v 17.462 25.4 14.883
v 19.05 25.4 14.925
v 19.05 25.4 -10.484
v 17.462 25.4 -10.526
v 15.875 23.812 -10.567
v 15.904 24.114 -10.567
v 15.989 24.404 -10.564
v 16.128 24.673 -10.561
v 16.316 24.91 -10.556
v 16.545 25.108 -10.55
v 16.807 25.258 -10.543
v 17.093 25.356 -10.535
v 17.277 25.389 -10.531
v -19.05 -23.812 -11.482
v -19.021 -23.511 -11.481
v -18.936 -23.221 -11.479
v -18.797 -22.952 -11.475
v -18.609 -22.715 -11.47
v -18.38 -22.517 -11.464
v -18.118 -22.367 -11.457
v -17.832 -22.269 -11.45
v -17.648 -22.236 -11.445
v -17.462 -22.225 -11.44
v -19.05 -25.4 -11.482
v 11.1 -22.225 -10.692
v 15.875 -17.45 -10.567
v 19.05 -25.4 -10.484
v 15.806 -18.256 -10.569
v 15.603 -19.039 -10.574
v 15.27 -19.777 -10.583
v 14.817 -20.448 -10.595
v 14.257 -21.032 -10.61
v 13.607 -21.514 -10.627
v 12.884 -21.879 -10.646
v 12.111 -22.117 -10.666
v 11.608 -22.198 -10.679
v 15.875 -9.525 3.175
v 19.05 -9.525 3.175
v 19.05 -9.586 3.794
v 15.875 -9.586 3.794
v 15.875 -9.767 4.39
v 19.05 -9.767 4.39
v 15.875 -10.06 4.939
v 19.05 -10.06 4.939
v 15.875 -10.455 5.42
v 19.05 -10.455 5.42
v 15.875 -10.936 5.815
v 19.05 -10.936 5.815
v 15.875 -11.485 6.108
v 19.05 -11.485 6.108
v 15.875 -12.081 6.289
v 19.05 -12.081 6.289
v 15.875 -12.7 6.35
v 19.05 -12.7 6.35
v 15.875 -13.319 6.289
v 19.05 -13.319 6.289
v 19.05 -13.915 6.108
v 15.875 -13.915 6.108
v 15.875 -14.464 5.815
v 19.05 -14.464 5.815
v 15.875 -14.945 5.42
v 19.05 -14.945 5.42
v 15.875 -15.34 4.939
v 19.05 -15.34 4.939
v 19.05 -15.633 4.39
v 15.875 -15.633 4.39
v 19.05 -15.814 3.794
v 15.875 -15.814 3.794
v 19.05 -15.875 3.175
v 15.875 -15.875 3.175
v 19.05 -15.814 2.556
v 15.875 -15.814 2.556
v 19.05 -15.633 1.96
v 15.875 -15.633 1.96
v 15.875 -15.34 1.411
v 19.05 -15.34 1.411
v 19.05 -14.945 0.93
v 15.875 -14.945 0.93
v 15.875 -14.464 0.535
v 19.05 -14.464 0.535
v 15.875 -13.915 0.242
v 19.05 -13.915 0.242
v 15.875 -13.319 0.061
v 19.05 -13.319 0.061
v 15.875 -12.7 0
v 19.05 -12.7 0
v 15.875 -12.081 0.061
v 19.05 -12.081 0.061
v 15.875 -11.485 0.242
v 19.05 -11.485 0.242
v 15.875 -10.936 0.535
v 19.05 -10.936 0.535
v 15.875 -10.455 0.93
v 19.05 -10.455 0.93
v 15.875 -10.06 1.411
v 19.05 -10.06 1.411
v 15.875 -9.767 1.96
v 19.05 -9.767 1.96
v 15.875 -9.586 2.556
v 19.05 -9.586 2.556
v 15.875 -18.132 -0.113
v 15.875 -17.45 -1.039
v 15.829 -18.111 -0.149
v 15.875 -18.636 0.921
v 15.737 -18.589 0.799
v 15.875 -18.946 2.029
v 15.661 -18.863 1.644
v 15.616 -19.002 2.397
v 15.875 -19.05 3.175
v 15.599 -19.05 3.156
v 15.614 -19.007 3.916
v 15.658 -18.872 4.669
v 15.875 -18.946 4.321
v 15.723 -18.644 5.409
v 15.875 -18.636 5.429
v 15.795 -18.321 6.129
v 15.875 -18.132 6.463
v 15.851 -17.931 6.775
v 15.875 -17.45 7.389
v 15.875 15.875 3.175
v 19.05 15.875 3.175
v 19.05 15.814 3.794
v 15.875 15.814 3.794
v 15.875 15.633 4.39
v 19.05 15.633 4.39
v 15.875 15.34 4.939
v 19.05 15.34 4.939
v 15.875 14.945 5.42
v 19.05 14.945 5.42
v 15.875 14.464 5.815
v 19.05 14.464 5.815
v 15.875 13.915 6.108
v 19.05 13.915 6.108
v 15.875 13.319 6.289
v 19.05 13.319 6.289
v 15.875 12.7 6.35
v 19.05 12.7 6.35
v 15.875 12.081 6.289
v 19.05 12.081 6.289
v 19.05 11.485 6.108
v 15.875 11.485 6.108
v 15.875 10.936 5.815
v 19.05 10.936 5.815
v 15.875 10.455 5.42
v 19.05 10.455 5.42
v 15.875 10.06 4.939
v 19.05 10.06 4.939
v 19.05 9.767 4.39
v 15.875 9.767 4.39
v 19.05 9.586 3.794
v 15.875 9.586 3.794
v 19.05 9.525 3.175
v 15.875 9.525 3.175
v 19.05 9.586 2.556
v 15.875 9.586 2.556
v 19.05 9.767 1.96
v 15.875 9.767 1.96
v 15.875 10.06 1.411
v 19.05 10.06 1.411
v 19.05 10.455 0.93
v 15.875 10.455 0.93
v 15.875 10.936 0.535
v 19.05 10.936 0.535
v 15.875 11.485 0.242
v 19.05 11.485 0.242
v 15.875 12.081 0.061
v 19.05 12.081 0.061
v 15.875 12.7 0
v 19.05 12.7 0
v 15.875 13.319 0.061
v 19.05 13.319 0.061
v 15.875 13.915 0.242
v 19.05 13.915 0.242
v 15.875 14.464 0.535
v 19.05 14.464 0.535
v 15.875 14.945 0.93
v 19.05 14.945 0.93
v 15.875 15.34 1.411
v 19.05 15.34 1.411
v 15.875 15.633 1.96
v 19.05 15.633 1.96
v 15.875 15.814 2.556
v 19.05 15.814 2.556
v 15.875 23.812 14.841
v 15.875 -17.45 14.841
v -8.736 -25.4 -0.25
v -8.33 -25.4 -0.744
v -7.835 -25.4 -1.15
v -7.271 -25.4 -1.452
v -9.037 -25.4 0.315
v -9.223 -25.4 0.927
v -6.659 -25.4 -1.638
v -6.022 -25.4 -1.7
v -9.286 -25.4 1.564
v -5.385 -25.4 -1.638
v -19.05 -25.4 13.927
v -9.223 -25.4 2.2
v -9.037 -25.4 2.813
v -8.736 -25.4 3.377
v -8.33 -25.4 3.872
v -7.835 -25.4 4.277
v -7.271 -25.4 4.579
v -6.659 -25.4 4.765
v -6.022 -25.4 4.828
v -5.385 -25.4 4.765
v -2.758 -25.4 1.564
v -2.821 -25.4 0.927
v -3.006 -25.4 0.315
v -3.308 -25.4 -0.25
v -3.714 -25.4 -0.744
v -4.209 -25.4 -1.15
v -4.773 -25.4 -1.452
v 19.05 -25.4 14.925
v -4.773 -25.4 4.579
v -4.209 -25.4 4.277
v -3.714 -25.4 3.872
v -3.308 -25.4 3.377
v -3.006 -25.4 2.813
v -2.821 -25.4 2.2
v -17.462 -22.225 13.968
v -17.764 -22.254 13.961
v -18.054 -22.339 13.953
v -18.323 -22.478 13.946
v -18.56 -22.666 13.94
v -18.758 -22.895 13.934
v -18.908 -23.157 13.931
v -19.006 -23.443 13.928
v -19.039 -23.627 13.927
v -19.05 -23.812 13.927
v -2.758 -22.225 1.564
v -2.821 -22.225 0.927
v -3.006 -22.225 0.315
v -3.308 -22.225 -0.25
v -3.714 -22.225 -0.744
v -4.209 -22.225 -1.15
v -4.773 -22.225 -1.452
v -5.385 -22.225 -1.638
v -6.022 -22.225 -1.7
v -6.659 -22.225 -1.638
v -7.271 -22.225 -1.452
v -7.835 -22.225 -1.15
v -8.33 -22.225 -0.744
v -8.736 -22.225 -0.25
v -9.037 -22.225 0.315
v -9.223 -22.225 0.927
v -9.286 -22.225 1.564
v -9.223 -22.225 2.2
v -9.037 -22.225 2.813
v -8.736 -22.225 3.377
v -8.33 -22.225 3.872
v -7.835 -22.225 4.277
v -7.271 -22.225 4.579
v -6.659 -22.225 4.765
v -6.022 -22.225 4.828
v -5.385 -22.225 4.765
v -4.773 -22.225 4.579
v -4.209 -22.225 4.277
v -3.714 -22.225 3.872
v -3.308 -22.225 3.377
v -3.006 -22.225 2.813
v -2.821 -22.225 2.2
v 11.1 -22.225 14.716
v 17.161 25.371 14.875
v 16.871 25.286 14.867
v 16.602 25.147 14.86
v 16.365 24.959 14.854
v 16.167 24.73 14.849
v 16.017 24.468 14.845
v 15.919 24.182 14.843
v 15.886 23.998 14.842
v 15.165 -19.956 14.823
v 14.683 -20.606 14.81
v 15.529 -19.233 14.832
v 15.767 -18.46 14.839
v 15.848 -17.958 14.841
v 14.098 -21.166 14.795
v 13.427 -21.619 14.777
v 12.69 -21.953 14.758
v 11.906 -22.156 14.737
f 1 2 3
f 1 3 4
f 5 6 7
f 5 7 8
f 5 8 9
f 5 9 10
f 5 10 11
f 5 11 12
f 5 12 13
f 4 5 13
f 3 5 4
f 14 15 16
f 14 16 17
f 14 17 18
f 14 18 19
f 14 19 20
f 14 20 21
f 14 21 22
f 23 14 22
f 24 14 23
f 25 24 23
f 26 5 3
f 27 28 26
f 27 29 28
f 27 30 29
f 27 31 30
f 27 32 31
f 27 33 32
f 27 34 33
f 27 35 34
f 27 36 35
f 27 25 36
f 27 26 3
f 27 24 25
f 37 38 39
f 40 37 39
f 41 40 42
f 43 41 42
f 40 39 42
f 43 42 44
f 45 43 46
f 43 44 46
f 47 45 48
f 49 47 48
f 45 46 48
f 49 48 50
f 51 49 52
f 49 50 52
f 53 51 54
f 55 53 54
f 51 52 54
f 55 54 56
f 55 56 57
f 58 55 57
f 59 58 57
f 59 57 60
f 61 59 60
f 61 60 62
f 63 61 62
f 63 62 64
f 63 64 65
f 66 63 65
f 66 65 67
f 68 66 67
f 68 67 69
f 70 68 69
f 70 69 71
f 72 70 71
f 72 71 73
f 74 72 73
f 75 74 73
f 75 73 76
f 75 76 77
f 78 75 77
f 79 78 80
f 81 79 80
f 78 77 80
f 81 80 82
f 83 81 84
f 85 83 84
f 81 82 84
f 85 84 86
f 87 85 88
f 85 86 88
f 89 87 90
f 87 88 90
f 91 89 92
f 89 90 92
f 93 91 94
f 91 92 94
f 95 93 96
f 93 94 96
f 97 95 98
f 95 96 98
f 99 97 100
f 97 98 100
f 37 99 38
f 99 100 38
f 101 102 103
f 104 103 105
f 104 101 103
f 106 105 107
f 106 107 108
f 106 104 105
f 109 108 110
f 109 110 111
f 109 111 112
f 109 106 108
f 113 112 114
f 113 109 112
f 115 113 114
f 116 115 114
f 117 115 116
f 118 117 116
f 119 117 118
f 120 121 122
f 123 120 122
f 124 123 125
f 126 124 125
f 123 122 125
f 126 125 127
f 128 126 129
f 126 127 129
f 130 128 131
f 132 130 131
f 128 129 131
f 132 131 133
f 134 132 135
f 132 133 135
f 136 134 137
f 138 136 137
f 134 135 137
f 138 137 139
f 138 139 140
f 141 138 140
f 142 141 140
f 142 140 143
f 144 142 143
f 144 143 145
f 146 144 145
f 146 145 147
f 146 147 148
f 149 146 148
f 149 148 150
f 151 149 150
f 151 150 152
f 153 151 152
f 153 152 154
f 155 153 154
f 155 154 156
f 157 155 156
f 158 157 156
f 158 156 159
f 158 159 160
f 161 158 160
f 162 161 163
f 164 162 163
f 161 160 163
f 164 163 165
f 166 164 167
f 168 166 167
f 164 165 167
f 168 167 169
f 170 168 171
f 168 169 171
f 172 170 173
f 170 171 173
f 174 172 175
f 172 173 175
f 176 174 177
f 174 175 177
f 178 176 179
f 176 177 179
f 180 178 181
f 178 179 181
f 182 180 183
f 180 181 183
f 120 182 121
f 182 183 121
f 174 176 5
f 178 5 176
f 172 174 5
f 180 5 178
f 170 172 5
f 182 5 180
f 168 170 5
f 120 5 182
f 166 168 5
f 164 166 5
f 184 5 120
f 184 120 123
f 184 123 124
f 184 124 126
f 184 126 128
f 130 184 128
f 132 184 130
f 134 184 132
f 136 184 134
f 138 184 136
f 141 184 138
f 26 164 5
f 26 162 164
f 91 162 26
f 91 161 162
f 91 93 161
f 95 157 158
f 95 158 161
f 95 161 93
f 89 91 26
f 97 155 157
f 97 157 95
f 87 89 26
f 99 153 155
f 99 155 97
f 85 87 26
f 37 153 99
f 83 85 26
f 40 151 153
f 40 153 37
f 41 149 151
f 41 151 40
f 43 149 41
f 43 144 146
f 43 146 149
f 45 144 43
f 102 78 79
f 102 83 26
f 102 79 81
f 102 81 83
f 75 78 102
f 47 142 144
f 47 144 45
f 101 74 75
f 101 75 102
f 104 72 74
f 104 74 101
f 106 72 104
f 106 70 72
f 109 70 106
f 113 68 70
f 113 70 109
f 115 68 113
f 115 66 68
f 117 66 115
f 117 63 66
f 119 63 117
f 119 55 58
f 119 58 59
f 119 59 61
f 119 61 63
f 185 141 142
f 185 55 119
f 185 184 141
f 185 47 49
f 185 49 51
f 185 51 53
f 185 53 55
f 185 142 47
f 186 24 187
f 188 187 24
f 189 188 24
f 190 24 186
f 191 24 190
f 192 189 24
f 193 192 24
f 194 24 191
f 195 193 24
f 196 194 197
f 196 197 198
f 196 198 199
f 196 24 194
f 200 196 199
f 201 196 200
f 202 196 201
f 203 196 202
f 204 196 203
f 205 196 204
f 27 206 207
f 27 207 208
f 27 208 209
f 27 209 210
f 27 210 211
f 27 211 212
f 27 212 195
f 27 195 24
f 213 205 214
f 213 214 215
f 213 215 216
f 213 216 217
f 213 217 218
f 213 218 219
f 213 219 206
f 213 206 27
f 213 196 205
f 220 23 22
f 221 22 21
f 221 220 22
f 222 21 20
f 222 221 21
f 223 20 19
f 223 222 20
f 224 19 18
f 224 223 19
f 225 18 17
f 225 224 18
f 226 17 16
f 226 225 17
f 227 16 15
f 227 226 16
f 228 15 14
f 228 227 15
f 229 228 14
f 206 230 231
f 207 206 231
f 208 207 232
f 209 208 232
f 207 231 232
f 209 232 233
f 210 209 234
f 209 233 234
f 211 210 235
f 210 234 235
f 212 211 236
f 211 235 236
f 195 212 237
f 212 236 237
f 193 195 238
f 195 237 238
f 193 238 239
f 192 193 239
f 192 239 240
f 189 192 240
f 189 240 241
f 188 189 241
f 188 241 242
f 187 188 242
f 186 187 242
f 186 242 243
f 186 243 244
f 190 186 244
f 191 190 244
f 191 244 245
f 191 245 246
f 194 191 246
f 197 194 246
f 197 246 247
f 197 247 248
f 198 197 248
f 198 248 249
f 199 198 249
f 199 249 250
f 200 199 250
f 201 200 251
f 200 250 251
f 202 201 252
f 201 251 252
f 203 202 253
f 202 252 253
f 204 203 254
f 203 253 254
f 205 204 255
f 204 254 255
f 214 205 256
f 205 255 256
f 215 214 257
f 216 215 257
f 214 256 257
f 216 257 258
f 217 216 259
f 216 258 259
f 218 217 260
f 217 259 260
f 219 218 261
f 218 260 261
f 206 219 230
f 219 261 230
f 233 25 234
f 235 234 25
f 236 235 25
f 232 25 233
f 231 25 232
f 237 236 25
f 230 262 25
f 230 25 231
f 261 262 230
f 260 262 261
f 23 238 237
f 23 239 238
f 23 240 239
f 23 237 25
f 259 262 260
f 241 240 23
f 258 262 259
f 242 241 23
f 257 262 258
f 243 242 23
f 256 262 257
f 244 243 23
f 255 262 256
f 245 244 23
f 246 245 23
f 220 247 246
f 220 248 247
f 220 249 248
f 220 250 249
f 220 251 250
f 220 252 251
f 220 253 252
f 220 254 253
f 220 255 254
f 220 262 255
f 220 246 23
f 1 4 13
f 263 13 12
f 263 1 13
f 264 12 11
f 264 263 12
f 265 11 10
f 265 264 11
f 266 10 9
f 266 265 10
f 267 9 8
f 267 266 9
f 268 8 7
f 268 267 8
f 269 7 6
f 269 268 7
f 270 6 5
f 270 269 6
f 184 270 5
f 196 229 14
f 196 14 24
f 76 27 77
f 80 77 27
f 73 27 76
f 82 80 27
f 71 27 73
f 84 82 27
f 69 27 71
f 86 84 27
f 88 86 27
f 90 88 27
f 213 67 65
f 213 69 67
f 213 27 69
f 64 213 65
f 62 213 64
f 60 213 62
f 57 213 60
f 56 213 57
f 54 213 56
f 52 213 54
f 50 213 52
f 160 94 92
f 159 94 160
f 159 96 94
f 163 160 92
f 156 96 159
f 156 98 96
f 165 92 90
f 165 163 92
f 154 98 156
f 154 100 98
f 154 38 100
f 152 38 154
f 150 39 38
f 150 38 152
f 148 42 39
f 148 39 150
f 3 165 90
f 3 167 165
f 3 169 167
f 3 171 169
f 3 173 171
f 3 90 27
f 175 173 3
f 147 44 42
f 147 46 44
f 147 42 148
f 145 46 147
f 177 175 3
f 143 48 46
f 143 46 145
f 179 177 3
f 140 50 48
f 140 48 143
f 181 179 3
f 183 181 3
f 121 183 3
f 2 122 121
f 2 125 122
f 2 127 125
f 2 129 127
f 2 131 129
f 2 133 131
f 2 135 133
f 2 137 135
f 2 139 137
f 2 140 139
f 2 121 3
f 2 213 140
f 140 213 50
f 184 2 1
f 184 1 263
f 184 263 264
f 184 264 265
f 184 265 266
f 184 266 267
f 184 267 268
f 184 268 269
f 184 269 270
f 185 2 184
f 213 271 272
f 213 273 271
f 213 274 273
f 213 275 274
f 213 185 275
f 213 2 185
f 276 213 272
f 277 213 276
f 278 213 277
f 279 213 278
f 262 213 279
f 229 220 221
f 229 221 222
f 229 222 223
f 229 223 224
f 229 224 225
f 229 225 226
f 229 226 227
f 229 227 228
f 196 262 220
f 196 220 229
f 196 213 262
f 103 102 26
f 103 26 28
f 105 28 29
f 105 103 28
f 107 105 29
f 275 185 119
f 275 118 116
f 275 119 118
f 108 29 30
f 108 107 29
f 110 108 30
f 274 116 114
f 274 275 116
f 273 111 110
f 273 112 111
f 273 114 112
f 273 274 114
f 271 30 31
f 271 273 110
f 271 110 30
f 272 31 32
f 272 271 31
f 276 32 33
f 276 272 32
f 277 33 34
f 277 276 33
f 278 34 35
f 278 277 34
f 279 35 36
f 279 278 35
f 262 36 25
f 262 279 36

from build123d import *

# Parameters (mm, degrees)
BOSS_EXTRUDE1_DEPTH     = 15.875
SKETCH4_R               = 3.175
CUT_EXTRUDE1_DEPTH      = 49.464271634
SKETCH3_OUTSIDE_W       = 54.3
SKETCH3_OUTSIDE_H       = 47.95
CUT_EXTRUDE2_DEPTH      = 57.529267862
F_1_4_CLEARANCE_HOLE1_D = 6.5278
SKETCH9_R               = 6.35
CUT_EXTRUDE3_DEPTH      = 2.54


with BuildPart() as part:
    # Sketch2 → Boss-Extrude1 (new, symmetric)
    with BuildSketch(Plane.XY):
        with BuildLine():
            Line((-19.05, -25.4), (19.05, -25.4))
            Line((19.05, -25.4), (19.05, 25.4))
            Line((19.05, 25.4), (17.4625, 25.4))
            ThreePointArc((17.4625, 25.4), (16.339967985, 24.935032015), (15.875, 23.8125))
            Line((15.875, 23.8125), (15.875, -17.4498))
            ThreePointArc((15.875, -17.4498), (14.476376302, -20.826376302), (11.0998, -22.225))
            Line((11.0998, -22.225), (-17.4625, -22.225))
            ThreePointArc((-17.4625, -22.225), (-18.585032015, -22.689967985), (-19.05, -23.8125))
            Line((-19.05, -23.8125), (-19.05, -25.4))
        make_face()
    extrude(amount=BOSS_EXTRUDE1_DEPTH, both=True)

    # Sketch4 → Cut-Extrude1 (cut, through all)
    with BuildSketch(Plane(origin=(19.05, 0, 0), x_dir=(0, 0, -1), z_dir=(1, 0, 0))):
        with Locations(Location((-3.175, 12.7, 0), (0, 0, 90))):
            Circle(SKETCH4_R)
        with Locations(Location((-3.175, -12.7, 0), (0, 0, 90))):
            Circle(SKETCH4_R)
    extrude(amount=-CUT_EXTRUDE1_DEPTH, mode=Mode.SUBTRACT)

    # Sketch3 outside → Cut-Extrude2 (cut, through all)
    with BuildSketch(Plane.XZ.offset(25.4)):
        Rectangle(SKETCH3_OUTSIDE_W, SKETCH3_OUTSIDE_H)
        Polygon((-19.05, 13.926834826), (-19.05, -11.481872103), (19.05, -10.484188491), (19.05, 14.924518438), align=None, mode=Mode.SUBTRACT)
    extrude(amount=-CUT_EXTRUDE2_DEPTH, mode=Mode.SUBTRACT)

    # 1/4 Clearance Hole1 (through all)
    with Locations(Plane(origin=(0, -25.4, 0), x_dir=(-1, 0, 0), z_dir=(0, -1, 0))):
        with Locations((6.021904729, -1.56363455)):
            Hole(F_1_4_CLEARANCE_HOLE1_D / 2)

    # Sketch9 → Cut-Extrude3 (cut)
    with BuildSketch(Plane.ZY.offset(-15.875)):
        with Locations((3.175, -12.7)):
            Circle(SKETCH9_R)
    extrude(amount=CUT_EXTRUDE3_DEPTH, mode=Mode.SUBTRACT)


solid = part.part
